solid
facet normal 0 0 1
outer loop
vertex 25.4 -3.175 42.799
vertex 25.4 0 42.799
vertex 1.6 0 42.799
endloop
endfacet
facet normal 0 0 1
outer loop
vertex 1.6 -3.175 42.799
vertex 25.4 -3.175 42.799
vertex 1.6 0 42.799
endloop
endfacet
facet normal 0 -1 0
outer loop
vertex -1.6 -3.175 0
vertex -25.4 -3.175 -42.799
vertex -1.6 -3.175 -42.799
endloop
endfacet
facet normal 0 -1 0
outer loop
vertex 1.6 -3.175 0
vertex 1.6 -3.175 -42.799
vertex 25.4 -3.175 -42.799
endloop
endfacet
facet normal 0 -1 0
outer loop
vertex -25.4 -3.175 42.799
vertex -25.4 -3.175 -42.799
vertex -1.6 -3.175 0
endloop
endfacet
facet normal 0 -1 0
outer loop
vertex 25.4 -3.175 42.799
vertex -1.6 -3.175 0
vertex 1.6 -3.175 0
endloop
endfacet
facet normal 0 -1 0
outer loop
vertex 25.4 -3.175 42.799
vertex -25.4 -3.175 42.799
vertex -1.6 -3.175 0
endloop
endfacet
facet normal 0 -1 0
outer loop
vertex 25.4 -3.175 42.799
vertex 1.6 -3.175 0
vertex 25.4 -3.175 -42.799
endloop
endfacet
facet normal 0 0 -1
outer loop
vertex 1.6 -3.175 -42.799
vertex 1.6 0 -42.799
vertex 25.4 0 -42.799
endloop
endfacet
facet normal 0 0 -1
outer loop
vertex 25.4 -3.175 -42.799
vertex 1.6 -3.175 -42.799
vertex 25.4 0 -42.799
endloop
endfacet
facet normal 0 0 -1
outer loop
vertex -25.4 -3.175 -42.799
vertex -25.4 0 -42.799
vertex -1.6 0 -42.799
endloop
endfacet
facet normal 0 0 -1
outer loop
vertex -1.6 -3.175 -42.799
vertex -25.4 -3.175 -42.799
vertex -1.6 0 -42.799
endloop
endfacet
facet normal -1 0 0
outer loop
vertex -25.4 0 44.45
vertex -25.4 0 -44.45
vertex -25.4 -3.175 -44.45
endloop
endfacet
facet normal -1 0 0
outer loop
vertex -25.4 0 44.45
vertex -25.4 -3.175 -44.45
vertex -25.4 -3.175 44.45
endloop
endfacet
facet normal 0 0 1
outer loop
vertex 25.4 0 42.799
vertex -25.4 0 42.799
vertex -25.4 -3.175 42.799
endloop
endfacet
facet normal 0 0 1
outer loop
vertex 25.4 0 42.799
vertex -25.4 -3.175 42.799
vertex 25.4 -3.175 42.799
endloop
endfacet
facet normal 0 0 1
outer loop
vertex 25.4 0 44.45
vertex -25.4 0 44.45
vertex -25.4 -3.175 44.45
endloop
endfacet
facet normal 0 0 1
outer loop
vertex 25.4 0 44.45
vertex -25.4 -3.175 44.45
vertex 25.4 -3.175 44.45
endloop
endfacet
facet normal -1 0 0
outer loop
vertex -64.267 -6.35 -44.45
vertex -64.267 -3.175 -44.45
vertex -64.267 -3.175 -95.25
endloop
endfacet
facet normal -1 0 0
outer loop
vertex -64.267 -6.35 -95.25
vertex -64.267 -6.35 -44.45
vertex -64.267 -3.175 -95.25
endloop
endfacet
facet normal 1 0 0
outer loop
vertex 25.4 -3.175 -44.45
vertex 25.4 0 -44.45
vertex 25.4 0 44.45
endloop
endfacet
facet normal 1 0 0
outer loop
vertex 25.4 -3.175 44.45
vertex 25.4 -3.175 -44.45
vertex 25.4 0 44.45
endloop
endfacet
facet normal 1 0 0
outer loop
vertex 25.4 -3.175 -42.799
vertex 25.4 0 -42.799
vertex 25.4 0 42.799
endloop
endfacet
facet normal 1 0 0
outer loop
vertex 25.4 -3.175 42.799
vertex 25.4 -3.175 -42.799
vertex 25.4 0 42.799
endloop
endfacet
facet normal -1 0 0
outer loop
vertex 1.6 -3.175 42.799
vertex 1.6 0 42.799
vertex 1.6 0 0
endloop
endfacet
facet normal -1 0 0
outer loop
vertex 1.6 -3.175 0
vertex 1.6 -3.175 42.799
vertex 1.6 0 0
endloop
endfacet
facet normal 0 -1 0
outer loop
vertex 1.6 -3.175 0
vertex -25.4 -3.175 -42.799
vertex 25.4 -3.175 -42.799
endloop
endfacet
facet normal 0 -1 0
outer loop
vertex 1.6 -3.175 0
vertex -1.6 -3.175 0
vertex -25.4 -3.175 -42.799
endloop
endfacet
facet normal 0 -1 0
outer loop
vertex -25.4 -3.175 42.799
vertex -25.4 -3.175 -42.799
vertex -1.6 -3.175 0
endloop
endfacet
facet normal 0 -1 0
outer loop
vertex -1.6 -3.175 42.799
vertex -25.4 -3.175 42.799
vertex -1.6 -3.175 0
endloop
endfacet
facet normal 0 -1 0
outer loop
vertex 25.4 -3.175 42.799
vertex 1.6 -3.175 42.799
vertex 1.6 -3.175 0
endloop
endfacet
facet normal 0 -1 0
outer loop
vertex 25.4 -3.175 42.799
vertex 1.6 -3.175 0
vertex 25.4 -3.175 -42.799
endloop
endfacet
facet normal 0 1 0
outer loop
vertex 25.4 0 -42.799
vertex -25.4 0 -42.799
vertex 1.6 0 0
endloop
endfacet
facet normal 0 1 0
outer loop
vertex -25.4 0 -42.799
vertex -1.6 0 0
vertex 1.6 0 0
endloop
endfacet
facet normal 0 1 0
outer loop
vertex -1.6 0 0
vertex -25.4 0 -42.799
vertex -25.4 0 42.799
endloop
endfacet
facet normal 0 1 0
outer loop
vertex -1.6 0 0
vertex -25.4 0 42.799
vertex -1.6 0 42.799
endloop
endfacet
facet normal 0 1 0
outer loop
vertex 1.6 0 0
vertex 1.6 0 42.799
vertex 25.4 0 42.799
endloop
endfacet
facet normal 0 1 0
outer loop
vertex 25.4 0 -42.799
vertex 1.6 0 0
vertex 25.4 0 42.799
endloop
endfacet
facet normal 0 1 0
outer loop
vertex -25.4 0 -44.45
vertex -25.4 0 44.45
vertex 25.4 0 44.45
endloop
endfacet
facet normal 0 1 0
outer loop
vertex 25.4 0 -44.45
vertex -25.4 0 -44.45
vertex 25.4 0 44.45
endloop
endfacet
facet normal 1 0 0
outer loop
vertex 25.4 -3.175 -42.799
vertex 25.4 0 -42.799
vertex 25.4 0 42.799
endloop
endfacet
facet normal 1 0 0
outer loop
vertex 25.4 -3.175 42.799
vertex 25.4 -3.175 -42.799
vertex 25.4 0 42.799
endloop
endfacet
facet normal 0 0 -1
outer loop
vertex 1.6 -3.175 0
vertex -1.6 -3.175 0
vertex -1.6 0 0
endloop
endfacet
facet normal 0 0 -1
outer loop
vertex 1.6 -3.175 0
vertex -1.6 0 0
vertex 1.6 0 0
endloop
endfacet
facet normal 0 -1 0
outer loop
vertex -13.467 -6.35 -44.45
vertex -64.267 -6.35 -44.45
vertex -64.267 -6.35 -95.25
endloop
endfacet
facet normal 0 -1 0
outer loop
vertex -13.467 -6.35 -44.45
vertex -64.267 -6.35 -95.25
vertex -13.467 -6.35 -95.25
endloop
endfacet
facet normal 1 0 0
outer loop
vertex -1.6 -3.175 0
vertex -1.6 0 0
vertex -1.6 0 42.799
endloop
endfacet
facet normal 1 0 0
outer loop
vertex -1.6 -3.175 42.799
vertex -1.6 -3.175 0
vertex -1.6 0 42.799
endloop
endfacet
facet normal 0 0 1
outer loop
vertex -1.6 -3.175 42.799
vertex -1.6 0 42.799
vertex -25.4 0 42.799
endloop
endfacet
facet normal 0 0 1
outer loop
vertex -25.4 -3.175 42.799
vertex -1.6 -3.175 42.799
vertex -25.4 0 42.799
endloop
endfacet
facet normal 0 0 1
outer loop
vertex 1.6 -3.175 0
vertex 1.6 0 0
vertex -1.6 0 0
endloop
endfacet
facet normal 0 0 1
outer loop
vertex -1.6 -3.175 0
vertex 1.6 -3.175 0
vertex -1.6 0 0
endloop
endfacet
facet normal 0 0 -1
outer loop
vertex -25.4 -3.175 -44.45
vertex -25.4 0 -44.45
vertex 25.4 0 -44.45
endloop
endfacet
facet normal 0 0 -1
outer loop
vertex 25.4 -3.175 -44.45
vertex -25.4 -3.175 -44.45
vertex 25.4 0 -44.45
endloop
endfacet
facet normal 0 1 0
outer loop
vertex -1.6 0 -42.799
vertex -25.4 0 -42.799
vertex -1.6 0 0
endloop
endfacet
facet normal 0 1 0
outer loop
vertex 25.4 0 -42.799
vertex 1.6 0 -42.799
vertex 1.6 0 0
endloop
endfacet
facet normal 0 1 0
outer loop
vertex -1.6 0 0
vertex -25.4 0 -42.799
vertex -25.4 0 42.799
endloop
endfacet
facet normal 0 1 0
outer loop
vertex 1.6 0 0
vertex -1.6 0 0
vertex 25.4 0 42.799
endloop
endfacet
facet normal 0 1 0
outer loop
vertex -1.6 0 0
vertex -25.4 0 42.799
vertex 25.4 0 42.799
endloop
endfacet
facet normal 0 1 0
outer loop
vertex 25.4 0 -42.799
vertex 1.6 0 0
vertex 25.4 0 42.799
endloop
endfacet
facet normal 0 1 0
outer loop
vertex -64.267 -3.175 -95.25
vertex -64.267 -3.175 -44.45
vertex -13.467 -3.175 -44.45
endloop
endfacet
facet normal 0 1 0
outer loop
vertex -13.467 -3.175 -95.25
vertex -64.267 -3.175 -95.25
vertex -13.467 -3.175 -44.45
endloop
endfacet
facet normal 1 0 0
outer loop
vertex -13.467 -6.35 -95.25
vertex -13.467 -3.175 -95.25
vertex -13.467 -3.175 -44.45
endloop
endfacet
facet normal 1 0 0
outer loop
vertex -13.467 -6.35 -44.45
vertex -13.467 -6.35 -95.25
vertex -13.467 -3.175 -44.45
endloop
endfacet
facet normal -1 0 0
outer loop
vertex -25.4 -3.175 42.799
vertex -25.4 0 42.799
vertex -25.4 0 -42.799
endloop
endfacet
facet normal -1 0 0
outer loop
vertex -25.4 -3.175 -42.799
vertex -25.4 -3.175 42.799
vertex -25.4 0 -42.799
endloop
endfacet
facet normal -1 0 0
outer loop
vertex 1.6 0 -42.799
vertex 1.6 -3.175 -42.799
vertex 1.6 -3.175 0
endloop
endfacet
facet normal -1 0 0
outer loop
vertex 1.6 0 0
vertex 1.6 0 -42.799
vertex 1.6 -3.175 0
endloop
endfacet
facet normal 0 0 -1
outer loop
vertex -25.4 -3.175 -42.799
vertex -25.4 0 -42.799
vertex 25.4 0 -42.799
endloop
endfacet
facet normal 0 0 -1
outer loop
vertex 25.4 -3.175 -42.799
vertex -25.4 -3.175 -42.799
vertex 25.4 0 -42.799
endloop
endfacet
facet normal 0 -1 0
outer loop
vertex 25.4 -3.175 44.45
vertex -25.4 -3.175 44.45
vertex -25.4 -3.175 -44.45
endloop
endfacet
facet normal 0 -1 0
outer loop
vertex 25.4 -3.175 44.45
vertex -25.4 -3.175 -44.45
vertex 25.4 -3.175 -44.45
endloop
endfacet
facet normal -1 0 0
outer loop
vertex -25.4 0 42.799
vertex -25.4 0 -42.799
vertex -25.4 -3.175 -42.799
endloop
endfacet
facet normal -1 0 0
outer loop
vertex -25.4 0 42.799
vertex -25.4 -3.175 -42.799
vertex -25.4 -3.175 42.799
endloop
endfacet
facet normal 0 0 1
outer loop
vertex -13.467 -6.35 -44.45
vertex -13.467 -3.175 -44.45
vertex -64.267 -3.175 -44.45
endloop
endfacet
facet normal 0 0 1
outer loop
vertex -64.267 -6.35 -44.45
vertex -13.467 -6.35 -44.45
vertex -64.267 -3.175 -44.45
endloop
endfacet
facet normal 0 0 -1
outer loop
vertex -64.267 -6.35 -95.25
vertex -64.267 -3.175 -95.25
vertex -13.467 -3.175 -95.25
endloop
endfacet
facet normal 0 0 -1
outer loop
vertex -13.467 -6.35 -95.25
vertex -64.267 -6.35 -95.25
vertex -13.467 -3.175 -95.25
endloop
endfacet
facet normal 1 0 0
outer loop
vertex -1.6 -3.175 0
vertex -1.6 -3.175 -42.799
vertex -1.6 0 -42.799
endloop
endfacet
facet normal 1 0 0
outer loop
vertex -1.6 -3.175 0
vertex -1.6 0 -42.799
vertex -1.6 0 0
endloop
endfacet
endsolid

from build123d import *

# Parameters (mm, degrees)
F0_W      = 50.8
F0_H      = 88.9
F1_DEPTH  = 3.175
F2_DEPTH  = 3.175
F4_DEPTH  = 3.175
F5_W      = 50.8
F5_H      = 85.598
F6_DEPTH  = 3.175
F7_W      = 3.2004
F7_H      = 42.799
F8_DEPTH  = 25.4
F10_DEPTH = 3.175


with BuildPart() as f1:
    # F0 (on Front) → F1 (new body)
    with BuildSketch(Plane.XZ):
        Rectangle(F0_W, F0_H)
    extrude(amount=F1_DEPTH)

    # F0 (on Front) → F2 (join)
    with BuildSketch(Plane.XZ):
        Rectangle(F0_W, F0_H)
    extrude(amount=F2_DEPTH)


with BuildPart() as f4:
    # F3 (on face) → F4 (new body)
    with BuildSketch(Plane.XZ.offset(3.175)):
        Polygon((-13.4667269886, -95.25), (-13.4667269886, -44.45), (-25.4, -44.45), (-64.2667269886, -44.45), (-64.2667269886, -95.25), align=None)
    extrude(amount=F4_DEPTH)


with BuildPart() as f6:
    # F5 (on Front) → F6 (new body)
    with BuildSketch(Plane.XZ):
        Rectangle(F5_W, F5_H)
    extrude(amount=F6_DEPTH)

    # F7 (on face) → F8 (cut)
    with BuildSketch(Plane.XZ.offset(3.175)):
        with Locations((0, -21.3995)):
            Rectangle(F7_W, F7_H)
    extrude(amount=-F8_DEPTH, mode=Mode.SUBTRACT)


with BuildPart() as f10:
    # F9 (on Front) → F10 (new body)
    with BuildSketch(Plane.XZ):
        Polygon((-25.4, -42.799), (25.4, -42.799), (25.4, 42.799), (1.6002, 42.799), (1.6002, 0), (-1.6002, 0), (-1.6002, 42.799), (-25.4, 42.799), align=None)
    extrude(amount=F10_DEPTH)


solid = Compound([f1.part, f4.part, f6.part, f10.part])
